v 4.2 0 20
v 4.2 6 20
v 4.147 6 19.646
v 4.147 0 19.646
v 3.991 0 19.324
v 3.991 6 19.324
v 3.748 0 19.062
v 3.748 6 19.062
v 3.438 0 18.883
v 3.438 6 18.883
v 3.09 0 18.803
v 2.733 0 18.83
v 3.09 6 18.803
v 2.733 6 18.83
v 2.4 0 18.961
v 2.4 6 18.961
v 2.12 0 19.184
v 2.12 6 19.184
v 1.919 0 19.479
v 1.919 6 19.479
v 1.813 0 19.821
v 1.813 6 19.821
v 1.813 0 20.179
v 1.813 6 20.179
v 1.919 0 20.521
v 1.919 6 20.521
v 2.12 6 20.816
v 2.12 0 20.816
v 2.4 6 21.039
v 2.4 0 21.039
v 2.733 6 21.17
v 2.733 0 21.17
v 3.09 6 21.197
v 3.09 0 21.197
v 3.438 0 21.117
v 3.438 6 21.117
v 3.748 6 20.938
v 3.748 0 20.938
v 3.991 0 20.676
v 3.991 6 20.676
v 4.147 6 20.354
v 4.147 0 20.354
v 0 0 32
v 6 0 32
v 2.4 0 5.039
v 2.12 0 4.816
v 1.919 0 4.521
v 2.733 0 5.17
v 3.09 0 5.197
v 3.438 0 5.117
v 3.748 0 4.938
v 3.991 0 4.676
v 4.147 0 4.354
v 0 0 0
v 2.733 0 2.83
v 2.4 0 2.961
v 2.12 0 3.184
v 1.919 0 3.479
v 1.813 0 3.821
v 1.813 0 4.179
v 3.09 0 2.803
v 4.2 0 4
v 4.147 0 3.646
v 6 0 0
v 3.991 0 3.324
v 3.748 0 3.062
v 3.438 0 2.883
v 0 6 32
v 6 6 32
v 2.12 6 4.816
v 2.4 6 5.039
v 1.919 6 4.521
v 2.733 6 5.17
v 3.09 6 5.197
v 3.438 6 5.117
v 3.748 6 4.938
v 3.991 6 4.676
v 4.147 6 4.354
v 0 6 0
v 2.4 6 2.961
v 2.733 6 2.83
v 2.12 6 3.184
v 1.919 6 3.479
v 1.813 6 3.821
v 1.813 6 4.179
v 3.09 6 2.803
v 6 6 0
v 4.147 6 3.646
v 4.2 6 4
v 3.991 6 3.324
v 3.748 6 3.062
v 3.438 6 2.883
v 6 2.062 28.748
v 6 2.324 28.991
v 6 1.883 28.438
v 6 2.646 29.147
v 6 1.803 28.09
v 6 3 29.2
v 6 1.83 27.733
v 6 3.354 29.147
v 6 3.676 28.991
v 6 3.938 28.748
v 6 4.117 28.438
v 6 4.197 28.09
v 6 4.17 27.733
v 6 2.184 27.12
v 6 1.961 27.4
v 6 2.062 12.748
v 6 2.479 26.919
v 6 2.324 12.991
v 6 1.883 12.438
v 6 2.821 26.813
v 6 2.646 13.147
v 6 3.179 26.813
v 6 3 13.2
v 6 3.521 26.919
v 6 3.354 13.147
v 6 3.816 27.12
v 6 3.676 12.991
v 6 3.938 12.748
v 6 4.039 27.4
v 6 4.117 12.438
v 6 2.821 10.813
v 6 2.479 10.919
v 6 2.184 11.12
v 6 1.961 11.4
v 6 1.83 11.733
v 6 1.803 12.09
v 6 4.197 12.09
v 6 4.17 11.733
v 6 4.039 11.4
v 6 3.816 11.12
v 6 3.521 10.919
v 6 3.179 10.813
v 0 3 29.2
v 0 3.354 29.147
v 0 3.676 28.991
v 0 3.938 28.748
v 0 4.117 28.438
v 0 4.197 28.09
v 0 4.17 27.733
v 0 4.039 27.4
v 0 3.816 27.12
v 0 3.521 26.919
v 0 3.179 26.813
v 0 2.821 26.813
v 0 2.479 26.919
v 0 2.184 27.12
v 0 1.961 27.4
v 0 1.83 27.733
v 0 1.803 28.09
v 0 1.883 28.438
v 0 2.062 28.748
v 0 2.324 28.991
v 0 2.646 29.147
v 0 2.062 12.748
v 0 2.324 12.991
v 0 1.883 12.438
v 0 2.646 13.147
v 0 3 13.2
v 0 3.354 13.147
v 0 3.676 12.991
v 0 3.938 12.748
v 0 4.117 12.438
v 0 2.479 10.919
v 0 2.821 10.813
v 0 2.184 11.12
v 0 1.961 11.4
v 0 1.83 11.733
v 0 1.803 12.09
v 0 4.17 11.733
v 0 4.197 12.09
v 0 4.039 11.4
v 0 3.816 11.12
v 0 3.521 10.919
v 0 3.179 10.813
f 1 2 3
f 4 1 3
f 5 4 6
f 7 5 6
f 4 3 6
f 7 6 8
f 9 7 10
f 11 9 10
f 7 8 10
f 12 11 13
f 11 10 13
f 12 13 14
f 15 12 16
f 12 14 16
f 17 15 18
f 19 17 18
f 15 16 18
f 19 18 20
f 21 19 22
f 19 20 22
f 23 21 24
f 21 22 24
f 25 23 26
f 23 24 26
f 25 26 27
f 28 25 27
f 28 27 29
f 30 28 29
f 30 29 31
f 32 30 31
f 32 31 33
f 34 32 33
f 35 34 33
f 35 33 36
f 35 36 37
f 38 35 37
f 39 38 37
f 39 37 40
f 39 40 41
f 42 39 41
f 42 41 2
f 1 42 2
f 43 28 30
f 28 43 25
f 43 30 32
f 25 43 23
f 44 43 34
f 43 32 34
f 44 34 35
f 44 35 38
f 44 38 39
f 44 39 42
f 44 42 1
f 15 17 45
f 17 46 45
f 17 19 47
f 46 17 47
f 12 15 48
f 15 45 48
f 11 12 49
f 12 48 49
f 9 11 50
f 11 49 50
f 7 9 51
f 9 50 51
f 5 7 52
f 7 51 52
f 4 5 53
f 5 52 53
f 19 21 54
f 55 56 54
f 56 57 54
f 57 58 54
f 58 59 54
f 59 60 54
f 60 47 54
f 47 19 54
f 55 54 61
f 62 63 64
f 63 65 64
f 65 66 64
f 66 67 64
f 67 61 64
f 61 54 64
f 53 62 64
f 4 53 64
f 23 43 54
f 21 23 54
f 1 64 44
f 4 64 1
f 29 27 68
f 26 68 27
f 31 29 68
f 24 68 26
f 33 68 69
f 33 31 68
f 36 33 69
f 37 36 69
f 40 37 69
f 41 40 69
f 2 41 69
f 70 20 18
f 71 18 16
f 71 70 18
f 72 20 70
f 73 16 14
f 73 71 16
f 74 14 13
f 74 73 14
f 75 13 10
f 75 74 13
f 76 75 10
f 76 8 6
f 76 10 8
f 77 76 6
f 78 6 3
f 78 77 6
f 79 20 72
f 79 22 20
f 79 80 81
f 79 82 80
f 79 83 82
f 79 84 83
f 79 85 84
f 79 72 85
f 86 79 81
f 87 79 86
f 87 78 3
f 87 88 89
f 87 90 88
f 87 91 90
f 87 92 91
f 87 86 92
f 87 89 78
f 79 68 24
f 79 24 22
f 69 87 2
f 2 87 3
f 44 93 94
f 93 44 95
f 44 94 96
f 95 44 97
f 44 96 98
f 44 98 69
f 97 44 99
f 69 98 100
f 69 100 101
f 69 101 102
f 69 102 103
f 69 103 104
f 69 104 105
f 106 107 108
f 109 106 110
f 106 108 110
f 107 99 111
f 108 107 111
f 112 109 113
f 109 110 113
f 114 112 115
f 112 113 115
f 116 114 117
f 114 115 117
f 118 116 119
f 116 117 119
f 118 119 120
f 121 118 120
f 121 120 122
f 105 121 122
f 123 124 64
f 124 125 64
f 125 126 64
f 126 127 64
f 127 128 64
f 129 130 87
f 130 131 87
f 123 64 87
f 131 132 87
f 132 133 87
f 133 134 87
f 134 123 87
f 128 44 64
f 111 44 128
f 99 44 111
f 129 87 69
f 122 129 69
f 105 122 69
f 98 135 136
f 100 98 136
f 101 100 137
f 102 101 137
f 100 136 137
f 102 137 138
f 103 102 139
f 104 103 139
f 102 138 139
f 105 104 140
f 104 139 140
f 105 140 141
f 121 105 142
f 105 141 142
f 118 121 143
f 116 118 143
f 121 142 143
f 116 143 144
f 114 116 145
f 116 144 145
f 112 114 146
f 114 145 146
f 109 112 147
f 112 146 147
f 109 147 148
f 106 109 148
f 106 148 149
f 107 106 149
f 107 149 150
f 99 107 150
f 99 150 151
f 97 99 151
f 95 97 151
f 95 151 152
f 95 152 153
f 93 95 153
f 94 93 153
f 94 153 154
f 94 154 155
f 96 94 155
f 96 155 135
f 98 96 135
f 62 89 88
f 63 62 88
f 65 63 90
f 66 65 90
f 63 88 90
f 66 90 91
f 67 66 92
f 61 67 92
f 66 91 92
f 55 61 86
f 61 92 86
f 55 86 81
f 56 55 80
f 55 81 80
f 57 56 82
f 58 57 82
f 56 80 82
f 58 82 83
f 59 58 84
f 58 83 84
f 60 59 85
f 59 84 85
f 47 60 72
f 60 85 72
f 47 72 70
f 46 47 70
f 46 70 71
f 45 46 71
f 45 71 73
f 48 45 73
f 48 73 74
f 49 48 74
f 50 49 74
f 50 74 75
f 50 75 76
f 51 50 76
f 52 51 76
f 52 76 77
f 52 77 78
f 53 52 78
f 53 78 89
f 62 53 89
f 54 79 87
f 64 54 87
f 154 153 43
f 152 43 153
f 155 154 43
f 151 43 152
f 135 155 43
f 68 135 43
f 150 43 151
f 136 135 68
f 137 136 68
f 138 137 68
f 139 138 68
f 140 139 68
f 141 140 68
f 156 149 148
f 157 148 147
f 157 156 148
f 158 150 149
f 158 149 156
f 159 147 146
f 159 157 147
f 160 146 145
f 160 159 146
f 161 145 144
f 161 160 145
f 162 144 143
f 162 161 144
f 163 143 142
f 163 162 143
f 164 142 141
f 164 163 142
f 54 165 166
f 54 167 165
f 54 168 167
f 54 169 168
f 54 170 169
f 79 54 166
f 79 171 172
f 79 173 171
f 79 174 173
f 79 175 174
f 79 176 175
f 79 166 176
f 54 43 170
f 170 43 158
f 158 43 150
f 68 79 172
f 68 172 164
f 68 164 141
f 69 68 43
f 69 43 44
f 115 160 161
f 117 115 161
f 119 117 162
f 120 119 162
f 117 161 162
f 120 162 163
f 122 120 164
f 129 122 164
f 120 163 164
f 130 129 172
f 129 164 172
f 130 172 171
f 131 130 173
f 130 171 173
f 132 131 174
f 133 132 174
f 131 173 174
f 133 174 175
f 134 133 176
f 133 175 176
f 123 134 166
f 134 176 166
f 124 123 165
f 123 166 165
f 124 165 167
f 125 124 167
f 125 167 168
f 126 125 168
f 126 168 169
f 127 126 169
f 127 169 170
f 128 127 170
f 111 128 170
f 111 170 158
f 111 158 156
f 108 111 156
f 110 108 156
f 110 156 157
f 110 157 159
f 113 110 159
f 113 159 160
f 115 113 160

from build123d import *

# Parameters (mm, degrees)
SKETCH_1_W          = 6
SKETCH_1_H          = 6
EXTRUDE_1_DEPTH     = 32
SKETCH_2_R          = 1.2
CUT_EXTRUDE_1_DEPTH = 50
SKETCH_3_R          = 1.2
CUT_EXTRUDE_2_DEPTH = 50


with BuildPart() as part:
    # 草图1 → 凸台-拉伸1 (new body)
    with BuildSketch(Plane.XY):
        with Locations((3, 3)):
            Rectangle(SKETCH_1_W, SKETCH_1_H)
    extrude(amount=EXTRUDE_1_DEPTH)

    # 草图2 → 切除-拉伸1 (cut)
    with BuildSketch(Plane(origin=(0, 6, 0), x_dir=(1, 0, 0), z_dir=(0, 1, 0))):
        with Locations((3, -4)):
            Circle(SKETCH_2_R)
        with Locations((3, -20)):
            Circle(SKETCH_2_R)
    extrude(amount=-CUT_EXTRUDE_1_DEPTH, mode=Mode.SUBTRACT)

    # 草图3 → 切除-拉伸2 (cut)
    with BuildSketch(Plane.ZY):
        with Locations((28, 3)):
            Circle(SKETCH_3_R)
        with Locations((12, 3)):
            Circle(SKETCH_3_R)
    extrude(amount=-CUT_EXTRUDE_2_DEPTH, mode=Mode.SUBTRACT)


solid = part.part
